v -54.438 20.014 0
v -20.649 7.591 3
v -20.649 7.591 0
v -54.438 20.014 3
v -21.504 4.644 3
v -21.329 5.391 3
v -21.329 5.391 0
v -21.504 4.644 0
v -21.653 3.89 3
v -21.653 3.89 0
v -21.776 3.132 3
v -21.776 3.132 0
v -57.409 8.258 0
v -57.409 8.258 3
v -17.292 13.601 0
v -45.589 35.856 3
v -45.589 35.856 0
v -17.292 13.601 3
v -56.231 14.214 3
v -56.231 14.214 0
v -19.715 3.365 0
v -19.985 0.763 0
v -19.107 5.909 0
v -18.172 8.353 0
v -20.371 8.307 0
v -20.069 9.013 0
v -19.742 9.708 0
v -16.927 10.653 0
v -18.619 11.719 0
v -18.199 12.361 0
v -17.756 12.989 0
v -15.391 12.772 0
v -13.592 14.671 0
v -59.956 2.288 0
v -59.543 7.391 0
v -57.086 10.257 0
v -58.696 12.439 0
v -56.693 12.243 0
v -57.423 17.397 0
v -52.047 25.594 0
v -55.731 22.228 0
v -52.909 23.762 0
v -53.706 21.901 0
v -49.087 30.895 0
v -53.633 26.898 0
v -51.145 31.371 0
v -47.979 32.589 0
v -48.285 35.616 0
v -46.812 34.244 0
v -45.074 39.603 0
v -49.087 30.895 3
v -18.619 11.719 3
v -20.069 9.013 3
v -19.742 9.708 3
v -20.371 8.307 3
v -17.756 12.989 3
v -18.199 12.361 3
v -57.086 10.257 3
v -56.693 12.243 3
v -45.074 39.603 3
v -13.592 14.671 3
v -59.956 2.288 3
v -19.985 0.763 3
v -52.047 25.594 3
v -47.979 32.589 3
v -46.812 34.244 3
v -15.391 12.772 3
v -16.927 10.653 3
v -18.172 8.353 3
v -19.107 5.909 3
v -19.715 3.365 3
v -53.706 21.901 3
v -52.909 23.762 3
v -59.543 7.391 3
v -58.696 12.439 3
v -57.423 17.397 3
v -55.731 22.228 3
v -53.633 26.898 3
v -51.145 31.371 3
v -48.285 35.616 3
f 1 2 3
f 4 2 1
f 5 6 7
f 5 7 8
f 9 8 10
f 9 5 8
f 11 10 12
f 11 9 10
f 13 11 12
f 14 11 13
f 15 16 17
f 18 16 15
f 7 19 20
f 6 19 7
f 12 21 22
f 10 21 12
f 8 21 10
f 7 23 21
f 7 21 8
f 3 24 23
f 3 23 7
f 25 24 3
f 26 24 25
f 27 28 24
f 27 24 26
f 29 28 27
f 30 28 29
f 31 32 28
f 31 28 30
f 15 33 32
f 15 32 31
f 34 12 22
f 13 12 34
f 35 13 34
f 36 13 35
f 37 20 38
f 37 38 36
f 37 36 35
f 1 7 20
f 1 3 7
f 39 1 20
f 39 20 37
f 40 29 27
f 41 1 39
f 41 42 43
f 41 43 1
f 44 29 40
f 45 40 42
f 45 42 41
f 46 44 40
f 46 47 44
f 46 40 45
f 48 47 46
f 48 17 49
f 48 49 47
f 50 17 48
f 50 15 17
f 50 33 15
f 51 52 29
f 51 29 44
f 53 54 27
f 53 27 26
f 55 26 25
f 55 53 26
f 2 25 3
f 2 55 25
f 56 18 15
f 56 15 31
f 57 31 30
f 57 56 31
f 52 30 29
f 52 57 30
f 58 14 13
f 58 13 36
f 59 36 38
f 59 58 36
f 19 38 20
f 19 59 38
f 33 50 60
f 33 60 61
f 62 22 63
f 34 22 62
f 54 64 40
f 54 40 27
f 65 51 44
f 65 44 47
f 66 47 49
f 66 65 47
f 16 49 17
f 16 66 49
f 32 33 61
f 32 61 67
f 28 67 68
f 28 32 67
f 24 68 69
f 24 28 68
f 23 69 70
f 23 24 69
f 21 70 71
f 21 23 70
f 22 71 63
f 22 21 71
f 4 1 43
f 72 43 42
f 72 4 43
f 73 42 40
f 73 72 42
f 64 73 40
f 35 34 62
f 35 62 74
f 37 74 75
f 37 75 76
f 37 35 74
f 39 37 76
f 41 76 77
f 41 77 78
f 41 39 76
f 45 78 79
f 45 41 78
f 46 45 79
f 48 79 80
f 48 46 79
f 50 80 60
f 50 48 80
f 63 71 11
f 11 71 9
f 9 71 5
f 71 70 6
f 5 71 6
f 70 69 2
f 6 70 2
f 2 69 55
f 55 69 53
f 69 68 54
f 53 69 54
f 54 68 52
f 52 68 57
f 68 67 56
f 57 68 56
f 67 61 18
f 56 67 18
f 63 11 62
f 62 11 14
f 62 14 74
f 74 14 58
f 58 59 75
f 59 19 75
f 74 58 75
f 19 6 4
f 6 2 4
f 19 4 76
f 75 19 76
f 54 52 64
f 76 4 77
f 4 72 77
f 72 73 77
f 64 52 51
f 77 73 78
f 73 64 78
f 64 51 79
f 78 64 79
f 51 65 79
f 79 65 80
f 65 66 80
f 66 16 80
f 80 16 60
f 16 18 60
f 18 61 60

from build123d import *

# Parameters (mm, degrees)
BOSS_EXTRUDE2_DEPTH = 3
CUT_EXTRUDE1_REACH  = 5


with BuildPart() as part:
    # Sketch1 → Boss-Extrude2 (new body)
    with BuildSketch(Plane.XY):
        with BuildLine():
            Line((-19.985447982, 0.762803358), (-59.956343946, 2.288410074))
            ThreePointArc((-59.956343946, 2.288410074), (-55.730717245, 22.228071336), (-45.073672701, 39.602576043))
            Line((-45.073672701, 39.602576043), (-13.592462366, 14.67122922))
            ThreePointArc((-13.592462366, 14.67122922), (-18.172234131, 8.352838241), (-19.985447982, 0.762803358))
        make_face()
    extrude(amount=BOSS_EXTRUDE2_DEPTH)

    # Sketch2 → Cut-Extrude1 (cut, up to next)
    with BuildSketch(Plane.XY.offset(3), mode=Mode.PRIVATE) as cut_extrude1_sk1:
        with BuildLine():
            Line((-45.58858723, 35.856390146), (-17.292222743, 13.600699711))
            ThreePointArc((-17.292222743, 13.600699711), (-17.980329977, 12.677055412), (-18.619154377, 11.718664185))
            Line((-18.619154377, 11.718664185), (-49.08686154, 30.894660124))
            ThreePointArc((-49.08686154, 30.894660124), (-47.402688122, 33.421327903), (-45.58858723, 35.856390146))
        make_face()
    cut_extrude1_tool1 = extrude(cut_extrude1_sk1.sketch, amount=-CUT_EXTRUDE1_REACH, mode=Mode.PRIVATE) & part.part
    add(cut_extrude1_tool1.solids().sort_by_distance((-34.882242, 24.593771, 3))[0], mode=Mode.SUBTRACT)
    # Sketch2 → Cut-Extrude1 (cut, up to next)
    with BuildSketch(Plane.XY.offset(3), mode=Mode.PRIVATE) as cut_extrude1_sk2:
        with BuildLine():
            Line((-52.047329922, 25.59444174), (-19.74209066, 9.708236522))
            ThreePointArc((-19.74209066, 9.708236522), (-20.223124653, 8.661710528), (-20.648728467, 7.591443388))
            Line((-20.648728467, 7.591443388), (-54.437556866, 20.013805296))
            ThreePointArc((-54.437556866, 20.013805296), (-53.315510448, 22.835418665), (-52.047329922, 25.59444174))
        make_face()
    cut_extrude1_tool2 = extrude(cut_extrude1_sk2.sketch, amount=-CUT_EXTRUDE1_REACH, mode=Mode.PRIVATE) & part.part
    add(cut_extrude1_tool2.solids().sort_by_distance((-39.233314, 16.803912, 3))[0], mode=Mode.SUBTRACT)
    # Sketch2 → Cut-Extrude1 (cut, up to next)
    with BuildSketch(Plane.XY.offset(3), mode=Mode.PRIVATE) as cut_extrude1_sk3:
        with BuildLine():
            Line((-56.231354546, 14.213893413), (-21.329134483, 5.391476812))
            ThreePointArc((-21.329134483, 5.391476812), (-21.58207174, 4.267807331), (-21.775854038, 3.132440087))
            Line((-21.775854038, 3.132440087), (-57.409069737, 8.25825114))
            ThreePointArc((-57.409069737, 8.25825114), (-56.898189132, 11.251492055), (-56.231354546, 14.213893413))
        make_face()
    cut_extrude1_tool3 = extrude(cut_extrude1_sk3.sketch, amount=-CUT_EXTRUDE1_REACH, mode=Mode.PRIVATE) & part.part
    add(cut_extrude1_tool3.solids().sort_by_distance((-41.869702, 8.279642, 3))[0], mode=Mode.SUBTRACT)


solid = part.part
